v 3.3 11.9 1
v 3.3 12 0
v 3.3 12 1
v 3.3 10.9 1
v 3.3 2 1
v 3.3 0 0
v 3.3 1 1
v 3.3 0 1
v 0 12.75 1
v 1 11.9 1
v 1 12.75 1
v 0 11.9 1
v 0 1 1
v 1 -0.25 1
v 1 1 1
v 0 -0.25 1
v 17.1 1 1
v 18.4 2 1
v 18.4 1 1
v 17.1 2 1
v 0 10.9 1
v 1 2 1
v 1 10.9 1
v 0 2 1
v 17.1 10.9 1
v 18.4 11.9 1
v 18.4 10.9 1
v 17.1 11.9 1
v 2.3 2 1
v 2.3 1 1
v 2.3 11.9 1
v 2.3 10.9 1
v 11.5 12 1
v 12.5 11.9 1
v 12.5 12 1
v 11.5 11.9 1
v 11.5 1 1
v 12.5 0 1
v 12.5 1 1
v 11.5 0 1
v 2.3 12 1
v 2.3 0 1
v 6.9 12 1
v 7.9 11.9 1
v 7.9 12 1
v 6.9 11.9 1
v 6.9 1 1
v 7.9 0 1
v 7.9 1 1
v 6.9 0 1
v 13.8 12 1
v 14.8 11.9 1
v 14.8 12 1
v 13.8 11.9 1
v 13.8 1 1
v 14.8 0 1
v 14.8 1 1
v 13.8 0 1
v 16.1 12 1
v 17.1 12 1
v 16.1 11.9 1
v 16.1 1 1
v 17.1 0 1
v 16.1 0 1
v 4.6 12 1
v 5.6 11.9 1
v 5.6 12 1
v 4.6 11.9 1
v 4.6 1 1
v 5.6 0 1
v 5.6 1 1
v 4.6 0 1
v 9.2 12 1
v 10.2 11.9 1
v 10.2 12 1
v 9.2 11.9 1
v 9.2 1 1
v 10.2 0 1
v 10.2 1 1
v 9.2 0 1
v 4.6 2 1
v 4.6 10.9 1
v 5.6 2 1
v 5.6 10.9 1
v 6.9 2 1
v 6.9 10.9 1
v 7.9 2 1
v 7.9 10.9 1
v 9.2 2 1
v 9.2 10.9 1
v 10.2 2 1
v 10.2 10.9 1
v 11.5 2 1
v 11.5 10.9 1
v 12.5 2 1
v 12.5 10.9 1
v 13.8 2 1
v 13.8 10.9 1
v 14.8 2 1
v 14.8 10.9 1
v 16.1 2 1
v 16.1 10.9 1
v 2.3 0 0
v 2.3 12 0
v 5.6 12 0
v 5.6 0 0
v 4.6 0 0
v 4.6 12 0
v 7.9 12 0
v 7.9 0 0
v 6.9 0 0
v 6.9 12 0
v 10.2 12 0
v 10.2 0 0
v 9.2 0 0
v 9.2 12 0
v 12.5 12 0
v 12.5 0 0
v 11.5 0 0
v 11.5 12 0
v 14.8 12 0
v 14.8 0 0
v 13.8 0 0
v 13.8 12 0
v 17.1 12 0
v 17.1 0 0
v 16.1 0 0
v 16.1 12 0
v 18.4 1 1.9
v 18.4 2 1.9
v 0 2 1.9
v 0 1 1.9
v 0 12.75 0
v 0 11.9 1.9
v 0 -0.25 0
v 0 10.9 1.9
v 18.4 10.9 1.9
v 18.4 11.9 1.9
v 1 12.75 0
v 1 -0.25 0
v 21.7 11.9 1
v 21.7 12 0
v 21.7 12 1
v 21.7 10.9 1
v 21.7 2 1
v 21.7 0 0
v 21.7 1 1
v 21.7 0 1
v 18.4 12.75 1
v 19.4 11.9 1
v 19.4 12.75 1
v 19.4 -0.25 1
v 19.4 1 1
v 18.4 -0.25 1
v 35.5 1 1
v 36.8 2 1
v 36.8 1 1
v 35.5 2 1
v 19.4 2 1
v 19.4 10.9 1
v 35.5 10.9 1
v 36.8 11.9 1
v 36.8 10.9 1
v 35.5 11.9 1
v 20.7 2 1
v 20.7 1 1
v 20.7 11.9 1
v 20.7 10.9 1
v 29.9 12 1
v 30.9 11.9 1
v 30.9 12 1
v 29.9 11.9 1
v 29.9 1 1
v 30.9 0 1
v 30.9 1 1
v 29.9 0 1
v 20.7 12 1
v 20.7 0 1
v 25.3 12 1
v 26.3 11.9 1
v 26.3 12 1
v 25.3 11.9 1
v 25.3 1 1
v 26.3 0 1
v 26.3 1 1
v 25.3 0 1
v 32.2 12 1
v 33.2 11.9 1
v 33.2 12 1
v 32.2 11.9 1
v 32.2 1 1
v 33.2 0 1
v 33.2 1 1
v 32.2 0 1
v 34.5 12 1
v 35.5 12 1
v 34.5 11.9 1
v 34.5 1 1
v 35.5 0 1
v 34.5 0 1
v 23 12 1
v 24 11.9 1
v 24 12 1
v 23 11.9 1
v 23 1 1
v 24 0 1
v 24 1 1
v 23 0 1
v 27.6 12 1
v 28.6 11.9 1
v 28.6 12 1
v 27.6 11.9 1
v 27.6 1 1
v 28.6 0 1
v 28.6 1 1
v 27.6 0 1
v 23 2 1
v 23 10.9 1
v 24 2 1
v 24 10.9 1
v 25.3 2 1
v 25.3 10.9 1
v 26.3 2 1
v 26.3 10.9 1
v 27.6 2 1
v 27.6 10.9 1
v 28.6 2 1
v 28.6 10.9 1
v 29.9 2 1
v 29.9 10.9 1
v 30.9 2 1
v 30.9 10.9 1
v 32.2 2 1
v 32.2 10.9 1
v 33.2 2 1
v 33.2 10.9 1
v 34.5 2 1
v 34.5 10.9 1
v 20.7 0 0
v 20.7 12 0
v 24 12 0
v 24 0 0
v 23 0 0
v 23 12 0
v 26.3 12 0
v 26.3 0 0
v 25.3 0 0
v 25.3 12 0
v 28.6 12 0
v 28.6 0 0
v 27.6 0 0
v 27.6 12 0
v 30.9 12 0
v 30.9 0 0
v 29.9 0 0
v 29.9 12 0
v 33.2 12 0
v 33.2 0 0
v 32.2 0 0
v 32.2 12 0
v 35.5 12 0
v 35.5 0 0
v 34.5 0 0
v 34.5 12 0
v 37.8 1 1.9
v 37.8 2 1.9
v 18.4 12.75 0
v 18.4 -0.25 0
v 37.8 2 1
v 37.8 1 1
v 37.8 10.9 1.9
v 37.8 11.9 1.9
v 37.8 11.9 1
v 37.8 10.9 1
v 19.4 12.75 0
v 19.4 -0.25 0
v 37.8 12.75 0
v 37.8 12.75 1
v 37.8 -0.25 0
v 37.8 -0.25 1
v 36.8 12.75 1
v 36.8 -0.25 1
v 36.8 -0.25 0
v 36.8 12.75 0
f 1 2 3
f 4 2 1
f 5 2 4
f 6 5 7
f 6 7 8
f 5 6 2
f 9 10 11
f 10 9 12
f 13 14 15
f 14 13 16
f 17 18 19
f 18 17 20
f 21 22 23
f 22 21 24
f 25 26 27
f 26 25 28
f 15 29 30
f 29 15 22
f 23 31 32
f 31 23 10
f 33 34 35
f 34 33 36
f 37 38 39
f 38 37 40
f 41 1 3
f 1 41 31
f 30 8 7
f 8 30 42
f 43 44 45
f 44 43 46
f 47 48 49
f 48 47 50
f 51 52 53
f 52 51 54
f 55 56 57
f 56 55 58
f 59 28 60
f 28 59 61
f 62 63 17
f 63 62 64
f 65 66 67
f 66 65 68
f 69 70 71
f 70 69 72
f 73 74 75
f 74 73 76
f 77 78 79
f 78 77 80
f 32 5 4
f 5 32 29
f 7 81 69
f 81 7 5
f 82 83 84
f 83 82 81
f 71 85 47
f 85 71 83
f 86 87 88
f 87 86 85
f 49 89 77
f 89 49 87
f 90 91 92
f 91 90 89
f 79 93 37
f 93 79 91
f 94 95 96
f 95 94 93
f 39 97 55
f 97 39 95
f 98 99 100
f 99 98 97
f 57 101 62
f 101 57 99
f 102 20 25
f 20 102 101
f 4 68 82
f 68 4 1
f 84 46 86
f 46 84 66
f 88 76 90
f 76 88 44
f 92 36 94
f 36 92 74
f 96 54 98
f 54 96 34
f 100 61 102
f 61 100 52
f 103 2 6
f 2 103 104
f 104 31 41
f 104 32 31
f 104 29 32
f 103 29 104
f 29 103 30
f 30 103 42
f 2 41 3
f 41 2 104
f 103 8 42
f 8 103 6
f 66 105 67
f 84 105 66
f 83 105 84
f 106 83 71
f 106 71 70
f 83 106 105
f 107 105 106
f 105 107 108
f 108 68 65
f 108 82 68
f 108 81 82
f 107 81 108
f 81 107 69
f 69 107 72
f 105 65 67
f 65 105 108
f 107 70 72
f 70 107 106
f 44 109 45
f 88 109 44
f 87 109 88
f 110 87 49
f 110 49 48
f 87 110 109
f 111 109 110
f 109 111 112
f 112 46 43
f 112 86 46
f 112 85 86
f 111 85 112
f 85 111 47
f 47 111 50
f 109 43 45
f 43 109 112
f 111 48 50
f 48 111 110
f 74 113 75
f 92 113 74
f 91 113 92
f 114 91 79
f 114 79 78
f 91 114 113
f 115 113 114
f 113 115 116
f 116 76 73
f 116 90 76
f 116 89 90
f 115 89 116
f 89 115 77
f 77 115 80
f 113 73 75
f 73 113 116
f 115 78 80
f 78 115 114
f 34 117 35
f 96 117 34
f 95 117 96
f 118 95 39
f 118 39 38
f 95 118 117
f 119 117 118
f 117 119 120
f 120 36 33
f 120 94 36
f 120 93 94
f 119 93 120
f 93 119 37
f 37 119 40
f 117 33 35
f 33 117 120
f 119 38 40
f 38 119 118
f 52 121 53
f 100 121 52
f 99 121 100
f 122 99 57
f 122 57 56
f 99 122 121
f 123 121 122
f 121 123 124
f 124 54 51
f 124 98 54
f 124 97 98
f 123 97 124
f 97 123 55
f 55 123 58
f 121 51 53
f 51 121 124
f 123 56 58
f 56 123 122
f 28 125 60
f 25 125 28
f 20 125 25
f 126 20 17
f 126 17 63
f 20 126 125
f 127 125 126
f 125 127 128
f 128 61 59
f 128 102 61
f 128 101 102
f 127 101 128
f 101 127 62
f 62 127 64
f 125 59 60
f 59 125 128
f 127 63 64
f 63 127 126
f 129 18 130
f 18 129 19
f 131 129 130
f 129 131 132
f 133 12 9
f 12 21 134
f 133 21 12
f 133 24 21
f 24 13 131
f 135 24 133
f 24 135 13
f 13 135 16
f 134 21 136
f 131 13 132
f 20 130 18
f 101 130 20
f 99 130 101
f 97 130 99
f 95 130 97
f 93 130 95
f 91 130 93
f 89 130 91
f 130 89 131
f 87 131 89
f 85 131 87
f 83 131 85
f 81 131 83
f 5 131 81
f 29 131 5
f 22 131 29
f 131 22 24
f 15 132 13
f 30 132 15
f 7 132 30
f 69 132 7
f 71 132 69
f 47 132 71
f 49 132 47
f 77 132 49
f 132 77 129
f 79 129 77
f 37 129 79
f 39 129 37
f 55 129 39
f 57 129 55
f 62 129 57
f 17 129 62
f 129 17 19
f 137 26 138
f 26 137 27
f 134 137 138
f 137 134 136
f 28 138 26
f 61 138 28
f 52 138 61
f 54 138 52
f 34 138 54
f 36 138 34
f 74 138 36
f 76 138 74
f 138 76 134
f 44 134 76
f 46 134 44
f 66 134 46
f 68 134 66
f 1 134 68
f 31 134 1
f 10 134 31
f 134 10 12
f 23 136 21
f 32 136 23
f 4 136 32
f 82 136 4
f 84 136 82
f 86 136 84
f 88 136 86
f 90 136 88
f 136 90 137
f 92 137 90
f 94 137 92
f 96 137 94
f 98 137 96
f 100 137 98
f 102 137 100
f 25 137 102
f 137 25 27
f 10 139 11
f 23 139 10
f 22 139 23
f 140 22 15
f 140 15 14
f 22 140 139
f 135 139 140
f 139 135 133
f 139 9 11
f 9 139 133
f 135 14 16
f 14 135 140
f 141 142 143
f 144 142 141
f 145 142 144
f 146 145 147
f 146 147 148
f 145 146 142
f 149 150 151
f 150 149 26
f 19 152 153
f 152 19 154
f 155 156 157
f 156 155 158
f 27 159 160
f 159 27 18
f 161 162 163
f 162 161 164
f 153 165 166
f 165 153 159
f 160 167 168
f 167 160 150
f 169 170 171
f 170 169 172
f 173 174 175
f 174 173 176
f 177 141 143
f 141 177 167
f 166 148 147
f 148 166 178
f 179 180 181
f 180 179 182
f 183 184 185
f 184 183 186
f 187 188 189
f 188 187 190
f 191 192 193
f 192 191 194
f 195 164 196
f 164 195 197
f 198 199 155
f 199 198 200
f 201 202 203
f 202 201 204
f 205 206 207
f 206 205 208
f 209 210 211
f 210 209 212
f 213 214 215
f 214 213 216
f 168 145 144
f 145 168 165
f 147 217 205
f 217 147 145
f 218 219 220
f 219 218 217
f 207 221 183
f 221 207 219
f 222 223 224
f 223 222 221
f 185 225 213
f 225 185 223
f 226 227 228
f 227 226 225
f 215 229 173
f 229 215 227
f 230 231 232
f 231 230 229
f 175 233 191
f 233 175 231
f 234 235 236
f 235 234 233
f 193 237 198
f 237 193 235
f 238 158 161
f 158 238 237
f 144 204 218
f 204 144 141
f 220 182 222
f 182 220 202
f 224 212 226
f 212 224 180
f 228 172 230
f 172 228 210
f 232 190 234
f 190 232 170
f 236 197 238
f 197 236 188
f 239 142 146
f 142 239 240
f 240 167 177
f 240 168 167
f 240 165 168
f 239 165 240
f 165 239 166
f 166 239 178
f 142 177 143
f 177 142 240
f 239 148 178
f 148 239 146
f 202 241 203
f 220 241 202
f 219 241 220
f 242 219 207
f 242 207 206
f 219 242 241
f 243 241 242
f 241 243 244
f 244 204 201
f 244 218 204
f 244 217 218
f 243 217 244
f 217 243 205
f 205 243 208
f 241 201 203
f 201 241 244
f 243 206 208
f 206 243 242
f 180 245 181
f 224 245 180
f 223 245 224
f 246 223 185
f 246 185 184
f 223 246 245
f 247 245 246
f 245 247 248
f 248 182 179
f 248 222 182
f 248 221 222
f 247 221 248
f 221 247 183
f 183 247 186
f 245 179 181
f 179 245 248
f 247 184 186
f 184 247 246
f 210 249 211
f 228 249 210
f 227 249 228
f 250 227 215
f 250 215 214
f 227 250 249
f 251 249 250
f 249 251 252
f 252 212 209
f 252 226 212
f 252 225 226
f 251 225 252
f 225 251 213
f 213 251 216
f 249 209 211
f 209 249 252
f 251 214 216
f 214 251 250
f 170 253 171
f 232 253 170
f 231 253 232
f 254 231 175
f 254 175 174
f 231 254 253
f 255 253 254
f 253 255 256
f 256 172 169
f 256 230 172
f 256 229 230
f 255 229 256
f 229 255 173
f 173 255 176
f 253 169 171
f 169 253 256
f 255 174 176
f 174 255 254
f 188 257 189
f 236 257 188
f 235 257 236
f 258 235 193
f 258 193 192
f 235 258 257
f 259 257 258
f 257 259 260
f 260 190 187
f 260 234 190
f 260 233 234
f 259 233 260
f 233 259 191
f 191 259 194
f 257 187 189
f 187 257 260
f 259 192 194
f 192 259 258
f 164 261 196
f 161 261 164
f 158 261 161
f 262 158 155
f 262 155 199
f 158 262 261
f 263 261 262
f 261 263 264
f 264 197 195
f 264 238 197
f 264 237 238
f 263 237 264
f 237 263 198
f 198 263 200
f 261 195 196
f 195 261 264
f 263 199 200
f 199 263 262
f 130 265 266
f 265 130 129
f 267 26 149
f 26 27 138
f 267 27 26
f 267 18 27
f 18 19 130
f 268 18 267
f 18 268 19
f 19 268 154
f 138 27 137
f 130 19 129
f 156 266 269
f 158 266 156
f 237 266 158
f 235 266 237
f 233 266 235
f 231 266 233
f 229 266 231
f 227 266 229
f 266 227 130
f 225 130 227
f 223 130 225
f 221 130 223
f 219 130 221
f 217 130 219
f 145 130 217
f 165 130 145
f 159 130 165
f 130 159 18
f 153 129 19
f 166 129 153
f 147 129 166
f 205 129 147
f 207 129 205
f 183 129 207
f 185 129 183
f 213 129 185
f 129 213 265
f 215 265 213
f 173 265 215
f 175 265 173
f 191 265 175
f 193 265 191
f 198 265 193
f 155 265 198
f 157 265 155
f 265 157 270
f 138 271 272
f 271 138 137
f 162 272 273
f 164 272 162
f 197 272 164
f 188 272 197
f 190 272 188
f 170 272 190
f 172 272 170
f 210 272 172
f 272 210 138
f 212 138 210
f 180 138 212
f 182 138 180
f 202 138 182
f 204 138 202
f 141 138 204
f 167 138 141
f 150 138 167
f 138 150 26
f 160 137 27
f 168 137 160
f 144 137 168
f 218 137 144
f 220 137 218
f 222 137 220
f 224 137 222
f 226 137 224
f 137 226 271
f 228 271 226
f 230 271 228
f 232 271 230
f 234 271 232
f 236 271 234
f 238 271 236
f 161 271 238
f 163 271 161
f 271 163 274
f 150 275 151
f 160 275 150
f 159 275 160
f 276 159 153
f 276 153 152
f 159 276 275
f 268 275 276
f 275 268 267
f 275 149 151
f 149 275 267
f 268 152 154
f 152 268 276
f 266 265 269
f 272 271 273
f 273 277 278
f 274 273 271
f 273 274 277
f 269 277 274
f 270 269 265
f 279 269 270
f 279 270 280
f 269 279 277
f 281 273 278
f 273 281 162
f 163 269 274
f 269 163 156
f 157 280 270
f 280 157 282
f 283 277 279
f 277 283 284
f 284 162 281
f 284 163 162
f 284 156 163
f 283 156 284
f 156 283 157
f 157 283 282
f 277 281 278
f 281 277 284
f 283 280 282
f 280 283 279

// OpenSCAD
//
//	Customizable Fence for N Scale Model Railroads
//	Steve Medwin
//	April 12, 2014
// 

// preview[view:north, tilt:bottom]

Nslats=8*1;
width=1*1;
height=12*1;
depth=1*1;
spacing=2.3*1;
bar_depth=depth-.1;
// How many fence sections?
number_sections=2; // [1:20]



module fence() {
// vertical slats
	for (i=[1:Nslats-1]){
		translate([i*spacing,0,0]) cube([width,height,depth]);
		}

// horizontal bars
	translate([0,1,depth]) cube([Nslats*spacing,width,bar_depth]);
	translate([0,height-1.1,depth]) cube([Nslats*spacing,width,bar_depth]);

// vertical post
	translate([0,,-0.250]) cube([width,height+1,depth]);
}

// make fence
for (j=[0:number_sections-1]) {
	translate ([j*Nslats*spacing,0,0]) fence();
}

// end the row of fences
// vertical post
	translate([number_sections*Nslats*spacing,-0.25,0]) cube([width,height+1,depth]);

// horizontal bars
	translate([number_sections*Nslats*spacing,1,depth]) cube([width,width,bar_depth]);
	translate([number_sections*Nslats*spacing,height-1.1,depth]) cube([width,width,bar_depth]);
